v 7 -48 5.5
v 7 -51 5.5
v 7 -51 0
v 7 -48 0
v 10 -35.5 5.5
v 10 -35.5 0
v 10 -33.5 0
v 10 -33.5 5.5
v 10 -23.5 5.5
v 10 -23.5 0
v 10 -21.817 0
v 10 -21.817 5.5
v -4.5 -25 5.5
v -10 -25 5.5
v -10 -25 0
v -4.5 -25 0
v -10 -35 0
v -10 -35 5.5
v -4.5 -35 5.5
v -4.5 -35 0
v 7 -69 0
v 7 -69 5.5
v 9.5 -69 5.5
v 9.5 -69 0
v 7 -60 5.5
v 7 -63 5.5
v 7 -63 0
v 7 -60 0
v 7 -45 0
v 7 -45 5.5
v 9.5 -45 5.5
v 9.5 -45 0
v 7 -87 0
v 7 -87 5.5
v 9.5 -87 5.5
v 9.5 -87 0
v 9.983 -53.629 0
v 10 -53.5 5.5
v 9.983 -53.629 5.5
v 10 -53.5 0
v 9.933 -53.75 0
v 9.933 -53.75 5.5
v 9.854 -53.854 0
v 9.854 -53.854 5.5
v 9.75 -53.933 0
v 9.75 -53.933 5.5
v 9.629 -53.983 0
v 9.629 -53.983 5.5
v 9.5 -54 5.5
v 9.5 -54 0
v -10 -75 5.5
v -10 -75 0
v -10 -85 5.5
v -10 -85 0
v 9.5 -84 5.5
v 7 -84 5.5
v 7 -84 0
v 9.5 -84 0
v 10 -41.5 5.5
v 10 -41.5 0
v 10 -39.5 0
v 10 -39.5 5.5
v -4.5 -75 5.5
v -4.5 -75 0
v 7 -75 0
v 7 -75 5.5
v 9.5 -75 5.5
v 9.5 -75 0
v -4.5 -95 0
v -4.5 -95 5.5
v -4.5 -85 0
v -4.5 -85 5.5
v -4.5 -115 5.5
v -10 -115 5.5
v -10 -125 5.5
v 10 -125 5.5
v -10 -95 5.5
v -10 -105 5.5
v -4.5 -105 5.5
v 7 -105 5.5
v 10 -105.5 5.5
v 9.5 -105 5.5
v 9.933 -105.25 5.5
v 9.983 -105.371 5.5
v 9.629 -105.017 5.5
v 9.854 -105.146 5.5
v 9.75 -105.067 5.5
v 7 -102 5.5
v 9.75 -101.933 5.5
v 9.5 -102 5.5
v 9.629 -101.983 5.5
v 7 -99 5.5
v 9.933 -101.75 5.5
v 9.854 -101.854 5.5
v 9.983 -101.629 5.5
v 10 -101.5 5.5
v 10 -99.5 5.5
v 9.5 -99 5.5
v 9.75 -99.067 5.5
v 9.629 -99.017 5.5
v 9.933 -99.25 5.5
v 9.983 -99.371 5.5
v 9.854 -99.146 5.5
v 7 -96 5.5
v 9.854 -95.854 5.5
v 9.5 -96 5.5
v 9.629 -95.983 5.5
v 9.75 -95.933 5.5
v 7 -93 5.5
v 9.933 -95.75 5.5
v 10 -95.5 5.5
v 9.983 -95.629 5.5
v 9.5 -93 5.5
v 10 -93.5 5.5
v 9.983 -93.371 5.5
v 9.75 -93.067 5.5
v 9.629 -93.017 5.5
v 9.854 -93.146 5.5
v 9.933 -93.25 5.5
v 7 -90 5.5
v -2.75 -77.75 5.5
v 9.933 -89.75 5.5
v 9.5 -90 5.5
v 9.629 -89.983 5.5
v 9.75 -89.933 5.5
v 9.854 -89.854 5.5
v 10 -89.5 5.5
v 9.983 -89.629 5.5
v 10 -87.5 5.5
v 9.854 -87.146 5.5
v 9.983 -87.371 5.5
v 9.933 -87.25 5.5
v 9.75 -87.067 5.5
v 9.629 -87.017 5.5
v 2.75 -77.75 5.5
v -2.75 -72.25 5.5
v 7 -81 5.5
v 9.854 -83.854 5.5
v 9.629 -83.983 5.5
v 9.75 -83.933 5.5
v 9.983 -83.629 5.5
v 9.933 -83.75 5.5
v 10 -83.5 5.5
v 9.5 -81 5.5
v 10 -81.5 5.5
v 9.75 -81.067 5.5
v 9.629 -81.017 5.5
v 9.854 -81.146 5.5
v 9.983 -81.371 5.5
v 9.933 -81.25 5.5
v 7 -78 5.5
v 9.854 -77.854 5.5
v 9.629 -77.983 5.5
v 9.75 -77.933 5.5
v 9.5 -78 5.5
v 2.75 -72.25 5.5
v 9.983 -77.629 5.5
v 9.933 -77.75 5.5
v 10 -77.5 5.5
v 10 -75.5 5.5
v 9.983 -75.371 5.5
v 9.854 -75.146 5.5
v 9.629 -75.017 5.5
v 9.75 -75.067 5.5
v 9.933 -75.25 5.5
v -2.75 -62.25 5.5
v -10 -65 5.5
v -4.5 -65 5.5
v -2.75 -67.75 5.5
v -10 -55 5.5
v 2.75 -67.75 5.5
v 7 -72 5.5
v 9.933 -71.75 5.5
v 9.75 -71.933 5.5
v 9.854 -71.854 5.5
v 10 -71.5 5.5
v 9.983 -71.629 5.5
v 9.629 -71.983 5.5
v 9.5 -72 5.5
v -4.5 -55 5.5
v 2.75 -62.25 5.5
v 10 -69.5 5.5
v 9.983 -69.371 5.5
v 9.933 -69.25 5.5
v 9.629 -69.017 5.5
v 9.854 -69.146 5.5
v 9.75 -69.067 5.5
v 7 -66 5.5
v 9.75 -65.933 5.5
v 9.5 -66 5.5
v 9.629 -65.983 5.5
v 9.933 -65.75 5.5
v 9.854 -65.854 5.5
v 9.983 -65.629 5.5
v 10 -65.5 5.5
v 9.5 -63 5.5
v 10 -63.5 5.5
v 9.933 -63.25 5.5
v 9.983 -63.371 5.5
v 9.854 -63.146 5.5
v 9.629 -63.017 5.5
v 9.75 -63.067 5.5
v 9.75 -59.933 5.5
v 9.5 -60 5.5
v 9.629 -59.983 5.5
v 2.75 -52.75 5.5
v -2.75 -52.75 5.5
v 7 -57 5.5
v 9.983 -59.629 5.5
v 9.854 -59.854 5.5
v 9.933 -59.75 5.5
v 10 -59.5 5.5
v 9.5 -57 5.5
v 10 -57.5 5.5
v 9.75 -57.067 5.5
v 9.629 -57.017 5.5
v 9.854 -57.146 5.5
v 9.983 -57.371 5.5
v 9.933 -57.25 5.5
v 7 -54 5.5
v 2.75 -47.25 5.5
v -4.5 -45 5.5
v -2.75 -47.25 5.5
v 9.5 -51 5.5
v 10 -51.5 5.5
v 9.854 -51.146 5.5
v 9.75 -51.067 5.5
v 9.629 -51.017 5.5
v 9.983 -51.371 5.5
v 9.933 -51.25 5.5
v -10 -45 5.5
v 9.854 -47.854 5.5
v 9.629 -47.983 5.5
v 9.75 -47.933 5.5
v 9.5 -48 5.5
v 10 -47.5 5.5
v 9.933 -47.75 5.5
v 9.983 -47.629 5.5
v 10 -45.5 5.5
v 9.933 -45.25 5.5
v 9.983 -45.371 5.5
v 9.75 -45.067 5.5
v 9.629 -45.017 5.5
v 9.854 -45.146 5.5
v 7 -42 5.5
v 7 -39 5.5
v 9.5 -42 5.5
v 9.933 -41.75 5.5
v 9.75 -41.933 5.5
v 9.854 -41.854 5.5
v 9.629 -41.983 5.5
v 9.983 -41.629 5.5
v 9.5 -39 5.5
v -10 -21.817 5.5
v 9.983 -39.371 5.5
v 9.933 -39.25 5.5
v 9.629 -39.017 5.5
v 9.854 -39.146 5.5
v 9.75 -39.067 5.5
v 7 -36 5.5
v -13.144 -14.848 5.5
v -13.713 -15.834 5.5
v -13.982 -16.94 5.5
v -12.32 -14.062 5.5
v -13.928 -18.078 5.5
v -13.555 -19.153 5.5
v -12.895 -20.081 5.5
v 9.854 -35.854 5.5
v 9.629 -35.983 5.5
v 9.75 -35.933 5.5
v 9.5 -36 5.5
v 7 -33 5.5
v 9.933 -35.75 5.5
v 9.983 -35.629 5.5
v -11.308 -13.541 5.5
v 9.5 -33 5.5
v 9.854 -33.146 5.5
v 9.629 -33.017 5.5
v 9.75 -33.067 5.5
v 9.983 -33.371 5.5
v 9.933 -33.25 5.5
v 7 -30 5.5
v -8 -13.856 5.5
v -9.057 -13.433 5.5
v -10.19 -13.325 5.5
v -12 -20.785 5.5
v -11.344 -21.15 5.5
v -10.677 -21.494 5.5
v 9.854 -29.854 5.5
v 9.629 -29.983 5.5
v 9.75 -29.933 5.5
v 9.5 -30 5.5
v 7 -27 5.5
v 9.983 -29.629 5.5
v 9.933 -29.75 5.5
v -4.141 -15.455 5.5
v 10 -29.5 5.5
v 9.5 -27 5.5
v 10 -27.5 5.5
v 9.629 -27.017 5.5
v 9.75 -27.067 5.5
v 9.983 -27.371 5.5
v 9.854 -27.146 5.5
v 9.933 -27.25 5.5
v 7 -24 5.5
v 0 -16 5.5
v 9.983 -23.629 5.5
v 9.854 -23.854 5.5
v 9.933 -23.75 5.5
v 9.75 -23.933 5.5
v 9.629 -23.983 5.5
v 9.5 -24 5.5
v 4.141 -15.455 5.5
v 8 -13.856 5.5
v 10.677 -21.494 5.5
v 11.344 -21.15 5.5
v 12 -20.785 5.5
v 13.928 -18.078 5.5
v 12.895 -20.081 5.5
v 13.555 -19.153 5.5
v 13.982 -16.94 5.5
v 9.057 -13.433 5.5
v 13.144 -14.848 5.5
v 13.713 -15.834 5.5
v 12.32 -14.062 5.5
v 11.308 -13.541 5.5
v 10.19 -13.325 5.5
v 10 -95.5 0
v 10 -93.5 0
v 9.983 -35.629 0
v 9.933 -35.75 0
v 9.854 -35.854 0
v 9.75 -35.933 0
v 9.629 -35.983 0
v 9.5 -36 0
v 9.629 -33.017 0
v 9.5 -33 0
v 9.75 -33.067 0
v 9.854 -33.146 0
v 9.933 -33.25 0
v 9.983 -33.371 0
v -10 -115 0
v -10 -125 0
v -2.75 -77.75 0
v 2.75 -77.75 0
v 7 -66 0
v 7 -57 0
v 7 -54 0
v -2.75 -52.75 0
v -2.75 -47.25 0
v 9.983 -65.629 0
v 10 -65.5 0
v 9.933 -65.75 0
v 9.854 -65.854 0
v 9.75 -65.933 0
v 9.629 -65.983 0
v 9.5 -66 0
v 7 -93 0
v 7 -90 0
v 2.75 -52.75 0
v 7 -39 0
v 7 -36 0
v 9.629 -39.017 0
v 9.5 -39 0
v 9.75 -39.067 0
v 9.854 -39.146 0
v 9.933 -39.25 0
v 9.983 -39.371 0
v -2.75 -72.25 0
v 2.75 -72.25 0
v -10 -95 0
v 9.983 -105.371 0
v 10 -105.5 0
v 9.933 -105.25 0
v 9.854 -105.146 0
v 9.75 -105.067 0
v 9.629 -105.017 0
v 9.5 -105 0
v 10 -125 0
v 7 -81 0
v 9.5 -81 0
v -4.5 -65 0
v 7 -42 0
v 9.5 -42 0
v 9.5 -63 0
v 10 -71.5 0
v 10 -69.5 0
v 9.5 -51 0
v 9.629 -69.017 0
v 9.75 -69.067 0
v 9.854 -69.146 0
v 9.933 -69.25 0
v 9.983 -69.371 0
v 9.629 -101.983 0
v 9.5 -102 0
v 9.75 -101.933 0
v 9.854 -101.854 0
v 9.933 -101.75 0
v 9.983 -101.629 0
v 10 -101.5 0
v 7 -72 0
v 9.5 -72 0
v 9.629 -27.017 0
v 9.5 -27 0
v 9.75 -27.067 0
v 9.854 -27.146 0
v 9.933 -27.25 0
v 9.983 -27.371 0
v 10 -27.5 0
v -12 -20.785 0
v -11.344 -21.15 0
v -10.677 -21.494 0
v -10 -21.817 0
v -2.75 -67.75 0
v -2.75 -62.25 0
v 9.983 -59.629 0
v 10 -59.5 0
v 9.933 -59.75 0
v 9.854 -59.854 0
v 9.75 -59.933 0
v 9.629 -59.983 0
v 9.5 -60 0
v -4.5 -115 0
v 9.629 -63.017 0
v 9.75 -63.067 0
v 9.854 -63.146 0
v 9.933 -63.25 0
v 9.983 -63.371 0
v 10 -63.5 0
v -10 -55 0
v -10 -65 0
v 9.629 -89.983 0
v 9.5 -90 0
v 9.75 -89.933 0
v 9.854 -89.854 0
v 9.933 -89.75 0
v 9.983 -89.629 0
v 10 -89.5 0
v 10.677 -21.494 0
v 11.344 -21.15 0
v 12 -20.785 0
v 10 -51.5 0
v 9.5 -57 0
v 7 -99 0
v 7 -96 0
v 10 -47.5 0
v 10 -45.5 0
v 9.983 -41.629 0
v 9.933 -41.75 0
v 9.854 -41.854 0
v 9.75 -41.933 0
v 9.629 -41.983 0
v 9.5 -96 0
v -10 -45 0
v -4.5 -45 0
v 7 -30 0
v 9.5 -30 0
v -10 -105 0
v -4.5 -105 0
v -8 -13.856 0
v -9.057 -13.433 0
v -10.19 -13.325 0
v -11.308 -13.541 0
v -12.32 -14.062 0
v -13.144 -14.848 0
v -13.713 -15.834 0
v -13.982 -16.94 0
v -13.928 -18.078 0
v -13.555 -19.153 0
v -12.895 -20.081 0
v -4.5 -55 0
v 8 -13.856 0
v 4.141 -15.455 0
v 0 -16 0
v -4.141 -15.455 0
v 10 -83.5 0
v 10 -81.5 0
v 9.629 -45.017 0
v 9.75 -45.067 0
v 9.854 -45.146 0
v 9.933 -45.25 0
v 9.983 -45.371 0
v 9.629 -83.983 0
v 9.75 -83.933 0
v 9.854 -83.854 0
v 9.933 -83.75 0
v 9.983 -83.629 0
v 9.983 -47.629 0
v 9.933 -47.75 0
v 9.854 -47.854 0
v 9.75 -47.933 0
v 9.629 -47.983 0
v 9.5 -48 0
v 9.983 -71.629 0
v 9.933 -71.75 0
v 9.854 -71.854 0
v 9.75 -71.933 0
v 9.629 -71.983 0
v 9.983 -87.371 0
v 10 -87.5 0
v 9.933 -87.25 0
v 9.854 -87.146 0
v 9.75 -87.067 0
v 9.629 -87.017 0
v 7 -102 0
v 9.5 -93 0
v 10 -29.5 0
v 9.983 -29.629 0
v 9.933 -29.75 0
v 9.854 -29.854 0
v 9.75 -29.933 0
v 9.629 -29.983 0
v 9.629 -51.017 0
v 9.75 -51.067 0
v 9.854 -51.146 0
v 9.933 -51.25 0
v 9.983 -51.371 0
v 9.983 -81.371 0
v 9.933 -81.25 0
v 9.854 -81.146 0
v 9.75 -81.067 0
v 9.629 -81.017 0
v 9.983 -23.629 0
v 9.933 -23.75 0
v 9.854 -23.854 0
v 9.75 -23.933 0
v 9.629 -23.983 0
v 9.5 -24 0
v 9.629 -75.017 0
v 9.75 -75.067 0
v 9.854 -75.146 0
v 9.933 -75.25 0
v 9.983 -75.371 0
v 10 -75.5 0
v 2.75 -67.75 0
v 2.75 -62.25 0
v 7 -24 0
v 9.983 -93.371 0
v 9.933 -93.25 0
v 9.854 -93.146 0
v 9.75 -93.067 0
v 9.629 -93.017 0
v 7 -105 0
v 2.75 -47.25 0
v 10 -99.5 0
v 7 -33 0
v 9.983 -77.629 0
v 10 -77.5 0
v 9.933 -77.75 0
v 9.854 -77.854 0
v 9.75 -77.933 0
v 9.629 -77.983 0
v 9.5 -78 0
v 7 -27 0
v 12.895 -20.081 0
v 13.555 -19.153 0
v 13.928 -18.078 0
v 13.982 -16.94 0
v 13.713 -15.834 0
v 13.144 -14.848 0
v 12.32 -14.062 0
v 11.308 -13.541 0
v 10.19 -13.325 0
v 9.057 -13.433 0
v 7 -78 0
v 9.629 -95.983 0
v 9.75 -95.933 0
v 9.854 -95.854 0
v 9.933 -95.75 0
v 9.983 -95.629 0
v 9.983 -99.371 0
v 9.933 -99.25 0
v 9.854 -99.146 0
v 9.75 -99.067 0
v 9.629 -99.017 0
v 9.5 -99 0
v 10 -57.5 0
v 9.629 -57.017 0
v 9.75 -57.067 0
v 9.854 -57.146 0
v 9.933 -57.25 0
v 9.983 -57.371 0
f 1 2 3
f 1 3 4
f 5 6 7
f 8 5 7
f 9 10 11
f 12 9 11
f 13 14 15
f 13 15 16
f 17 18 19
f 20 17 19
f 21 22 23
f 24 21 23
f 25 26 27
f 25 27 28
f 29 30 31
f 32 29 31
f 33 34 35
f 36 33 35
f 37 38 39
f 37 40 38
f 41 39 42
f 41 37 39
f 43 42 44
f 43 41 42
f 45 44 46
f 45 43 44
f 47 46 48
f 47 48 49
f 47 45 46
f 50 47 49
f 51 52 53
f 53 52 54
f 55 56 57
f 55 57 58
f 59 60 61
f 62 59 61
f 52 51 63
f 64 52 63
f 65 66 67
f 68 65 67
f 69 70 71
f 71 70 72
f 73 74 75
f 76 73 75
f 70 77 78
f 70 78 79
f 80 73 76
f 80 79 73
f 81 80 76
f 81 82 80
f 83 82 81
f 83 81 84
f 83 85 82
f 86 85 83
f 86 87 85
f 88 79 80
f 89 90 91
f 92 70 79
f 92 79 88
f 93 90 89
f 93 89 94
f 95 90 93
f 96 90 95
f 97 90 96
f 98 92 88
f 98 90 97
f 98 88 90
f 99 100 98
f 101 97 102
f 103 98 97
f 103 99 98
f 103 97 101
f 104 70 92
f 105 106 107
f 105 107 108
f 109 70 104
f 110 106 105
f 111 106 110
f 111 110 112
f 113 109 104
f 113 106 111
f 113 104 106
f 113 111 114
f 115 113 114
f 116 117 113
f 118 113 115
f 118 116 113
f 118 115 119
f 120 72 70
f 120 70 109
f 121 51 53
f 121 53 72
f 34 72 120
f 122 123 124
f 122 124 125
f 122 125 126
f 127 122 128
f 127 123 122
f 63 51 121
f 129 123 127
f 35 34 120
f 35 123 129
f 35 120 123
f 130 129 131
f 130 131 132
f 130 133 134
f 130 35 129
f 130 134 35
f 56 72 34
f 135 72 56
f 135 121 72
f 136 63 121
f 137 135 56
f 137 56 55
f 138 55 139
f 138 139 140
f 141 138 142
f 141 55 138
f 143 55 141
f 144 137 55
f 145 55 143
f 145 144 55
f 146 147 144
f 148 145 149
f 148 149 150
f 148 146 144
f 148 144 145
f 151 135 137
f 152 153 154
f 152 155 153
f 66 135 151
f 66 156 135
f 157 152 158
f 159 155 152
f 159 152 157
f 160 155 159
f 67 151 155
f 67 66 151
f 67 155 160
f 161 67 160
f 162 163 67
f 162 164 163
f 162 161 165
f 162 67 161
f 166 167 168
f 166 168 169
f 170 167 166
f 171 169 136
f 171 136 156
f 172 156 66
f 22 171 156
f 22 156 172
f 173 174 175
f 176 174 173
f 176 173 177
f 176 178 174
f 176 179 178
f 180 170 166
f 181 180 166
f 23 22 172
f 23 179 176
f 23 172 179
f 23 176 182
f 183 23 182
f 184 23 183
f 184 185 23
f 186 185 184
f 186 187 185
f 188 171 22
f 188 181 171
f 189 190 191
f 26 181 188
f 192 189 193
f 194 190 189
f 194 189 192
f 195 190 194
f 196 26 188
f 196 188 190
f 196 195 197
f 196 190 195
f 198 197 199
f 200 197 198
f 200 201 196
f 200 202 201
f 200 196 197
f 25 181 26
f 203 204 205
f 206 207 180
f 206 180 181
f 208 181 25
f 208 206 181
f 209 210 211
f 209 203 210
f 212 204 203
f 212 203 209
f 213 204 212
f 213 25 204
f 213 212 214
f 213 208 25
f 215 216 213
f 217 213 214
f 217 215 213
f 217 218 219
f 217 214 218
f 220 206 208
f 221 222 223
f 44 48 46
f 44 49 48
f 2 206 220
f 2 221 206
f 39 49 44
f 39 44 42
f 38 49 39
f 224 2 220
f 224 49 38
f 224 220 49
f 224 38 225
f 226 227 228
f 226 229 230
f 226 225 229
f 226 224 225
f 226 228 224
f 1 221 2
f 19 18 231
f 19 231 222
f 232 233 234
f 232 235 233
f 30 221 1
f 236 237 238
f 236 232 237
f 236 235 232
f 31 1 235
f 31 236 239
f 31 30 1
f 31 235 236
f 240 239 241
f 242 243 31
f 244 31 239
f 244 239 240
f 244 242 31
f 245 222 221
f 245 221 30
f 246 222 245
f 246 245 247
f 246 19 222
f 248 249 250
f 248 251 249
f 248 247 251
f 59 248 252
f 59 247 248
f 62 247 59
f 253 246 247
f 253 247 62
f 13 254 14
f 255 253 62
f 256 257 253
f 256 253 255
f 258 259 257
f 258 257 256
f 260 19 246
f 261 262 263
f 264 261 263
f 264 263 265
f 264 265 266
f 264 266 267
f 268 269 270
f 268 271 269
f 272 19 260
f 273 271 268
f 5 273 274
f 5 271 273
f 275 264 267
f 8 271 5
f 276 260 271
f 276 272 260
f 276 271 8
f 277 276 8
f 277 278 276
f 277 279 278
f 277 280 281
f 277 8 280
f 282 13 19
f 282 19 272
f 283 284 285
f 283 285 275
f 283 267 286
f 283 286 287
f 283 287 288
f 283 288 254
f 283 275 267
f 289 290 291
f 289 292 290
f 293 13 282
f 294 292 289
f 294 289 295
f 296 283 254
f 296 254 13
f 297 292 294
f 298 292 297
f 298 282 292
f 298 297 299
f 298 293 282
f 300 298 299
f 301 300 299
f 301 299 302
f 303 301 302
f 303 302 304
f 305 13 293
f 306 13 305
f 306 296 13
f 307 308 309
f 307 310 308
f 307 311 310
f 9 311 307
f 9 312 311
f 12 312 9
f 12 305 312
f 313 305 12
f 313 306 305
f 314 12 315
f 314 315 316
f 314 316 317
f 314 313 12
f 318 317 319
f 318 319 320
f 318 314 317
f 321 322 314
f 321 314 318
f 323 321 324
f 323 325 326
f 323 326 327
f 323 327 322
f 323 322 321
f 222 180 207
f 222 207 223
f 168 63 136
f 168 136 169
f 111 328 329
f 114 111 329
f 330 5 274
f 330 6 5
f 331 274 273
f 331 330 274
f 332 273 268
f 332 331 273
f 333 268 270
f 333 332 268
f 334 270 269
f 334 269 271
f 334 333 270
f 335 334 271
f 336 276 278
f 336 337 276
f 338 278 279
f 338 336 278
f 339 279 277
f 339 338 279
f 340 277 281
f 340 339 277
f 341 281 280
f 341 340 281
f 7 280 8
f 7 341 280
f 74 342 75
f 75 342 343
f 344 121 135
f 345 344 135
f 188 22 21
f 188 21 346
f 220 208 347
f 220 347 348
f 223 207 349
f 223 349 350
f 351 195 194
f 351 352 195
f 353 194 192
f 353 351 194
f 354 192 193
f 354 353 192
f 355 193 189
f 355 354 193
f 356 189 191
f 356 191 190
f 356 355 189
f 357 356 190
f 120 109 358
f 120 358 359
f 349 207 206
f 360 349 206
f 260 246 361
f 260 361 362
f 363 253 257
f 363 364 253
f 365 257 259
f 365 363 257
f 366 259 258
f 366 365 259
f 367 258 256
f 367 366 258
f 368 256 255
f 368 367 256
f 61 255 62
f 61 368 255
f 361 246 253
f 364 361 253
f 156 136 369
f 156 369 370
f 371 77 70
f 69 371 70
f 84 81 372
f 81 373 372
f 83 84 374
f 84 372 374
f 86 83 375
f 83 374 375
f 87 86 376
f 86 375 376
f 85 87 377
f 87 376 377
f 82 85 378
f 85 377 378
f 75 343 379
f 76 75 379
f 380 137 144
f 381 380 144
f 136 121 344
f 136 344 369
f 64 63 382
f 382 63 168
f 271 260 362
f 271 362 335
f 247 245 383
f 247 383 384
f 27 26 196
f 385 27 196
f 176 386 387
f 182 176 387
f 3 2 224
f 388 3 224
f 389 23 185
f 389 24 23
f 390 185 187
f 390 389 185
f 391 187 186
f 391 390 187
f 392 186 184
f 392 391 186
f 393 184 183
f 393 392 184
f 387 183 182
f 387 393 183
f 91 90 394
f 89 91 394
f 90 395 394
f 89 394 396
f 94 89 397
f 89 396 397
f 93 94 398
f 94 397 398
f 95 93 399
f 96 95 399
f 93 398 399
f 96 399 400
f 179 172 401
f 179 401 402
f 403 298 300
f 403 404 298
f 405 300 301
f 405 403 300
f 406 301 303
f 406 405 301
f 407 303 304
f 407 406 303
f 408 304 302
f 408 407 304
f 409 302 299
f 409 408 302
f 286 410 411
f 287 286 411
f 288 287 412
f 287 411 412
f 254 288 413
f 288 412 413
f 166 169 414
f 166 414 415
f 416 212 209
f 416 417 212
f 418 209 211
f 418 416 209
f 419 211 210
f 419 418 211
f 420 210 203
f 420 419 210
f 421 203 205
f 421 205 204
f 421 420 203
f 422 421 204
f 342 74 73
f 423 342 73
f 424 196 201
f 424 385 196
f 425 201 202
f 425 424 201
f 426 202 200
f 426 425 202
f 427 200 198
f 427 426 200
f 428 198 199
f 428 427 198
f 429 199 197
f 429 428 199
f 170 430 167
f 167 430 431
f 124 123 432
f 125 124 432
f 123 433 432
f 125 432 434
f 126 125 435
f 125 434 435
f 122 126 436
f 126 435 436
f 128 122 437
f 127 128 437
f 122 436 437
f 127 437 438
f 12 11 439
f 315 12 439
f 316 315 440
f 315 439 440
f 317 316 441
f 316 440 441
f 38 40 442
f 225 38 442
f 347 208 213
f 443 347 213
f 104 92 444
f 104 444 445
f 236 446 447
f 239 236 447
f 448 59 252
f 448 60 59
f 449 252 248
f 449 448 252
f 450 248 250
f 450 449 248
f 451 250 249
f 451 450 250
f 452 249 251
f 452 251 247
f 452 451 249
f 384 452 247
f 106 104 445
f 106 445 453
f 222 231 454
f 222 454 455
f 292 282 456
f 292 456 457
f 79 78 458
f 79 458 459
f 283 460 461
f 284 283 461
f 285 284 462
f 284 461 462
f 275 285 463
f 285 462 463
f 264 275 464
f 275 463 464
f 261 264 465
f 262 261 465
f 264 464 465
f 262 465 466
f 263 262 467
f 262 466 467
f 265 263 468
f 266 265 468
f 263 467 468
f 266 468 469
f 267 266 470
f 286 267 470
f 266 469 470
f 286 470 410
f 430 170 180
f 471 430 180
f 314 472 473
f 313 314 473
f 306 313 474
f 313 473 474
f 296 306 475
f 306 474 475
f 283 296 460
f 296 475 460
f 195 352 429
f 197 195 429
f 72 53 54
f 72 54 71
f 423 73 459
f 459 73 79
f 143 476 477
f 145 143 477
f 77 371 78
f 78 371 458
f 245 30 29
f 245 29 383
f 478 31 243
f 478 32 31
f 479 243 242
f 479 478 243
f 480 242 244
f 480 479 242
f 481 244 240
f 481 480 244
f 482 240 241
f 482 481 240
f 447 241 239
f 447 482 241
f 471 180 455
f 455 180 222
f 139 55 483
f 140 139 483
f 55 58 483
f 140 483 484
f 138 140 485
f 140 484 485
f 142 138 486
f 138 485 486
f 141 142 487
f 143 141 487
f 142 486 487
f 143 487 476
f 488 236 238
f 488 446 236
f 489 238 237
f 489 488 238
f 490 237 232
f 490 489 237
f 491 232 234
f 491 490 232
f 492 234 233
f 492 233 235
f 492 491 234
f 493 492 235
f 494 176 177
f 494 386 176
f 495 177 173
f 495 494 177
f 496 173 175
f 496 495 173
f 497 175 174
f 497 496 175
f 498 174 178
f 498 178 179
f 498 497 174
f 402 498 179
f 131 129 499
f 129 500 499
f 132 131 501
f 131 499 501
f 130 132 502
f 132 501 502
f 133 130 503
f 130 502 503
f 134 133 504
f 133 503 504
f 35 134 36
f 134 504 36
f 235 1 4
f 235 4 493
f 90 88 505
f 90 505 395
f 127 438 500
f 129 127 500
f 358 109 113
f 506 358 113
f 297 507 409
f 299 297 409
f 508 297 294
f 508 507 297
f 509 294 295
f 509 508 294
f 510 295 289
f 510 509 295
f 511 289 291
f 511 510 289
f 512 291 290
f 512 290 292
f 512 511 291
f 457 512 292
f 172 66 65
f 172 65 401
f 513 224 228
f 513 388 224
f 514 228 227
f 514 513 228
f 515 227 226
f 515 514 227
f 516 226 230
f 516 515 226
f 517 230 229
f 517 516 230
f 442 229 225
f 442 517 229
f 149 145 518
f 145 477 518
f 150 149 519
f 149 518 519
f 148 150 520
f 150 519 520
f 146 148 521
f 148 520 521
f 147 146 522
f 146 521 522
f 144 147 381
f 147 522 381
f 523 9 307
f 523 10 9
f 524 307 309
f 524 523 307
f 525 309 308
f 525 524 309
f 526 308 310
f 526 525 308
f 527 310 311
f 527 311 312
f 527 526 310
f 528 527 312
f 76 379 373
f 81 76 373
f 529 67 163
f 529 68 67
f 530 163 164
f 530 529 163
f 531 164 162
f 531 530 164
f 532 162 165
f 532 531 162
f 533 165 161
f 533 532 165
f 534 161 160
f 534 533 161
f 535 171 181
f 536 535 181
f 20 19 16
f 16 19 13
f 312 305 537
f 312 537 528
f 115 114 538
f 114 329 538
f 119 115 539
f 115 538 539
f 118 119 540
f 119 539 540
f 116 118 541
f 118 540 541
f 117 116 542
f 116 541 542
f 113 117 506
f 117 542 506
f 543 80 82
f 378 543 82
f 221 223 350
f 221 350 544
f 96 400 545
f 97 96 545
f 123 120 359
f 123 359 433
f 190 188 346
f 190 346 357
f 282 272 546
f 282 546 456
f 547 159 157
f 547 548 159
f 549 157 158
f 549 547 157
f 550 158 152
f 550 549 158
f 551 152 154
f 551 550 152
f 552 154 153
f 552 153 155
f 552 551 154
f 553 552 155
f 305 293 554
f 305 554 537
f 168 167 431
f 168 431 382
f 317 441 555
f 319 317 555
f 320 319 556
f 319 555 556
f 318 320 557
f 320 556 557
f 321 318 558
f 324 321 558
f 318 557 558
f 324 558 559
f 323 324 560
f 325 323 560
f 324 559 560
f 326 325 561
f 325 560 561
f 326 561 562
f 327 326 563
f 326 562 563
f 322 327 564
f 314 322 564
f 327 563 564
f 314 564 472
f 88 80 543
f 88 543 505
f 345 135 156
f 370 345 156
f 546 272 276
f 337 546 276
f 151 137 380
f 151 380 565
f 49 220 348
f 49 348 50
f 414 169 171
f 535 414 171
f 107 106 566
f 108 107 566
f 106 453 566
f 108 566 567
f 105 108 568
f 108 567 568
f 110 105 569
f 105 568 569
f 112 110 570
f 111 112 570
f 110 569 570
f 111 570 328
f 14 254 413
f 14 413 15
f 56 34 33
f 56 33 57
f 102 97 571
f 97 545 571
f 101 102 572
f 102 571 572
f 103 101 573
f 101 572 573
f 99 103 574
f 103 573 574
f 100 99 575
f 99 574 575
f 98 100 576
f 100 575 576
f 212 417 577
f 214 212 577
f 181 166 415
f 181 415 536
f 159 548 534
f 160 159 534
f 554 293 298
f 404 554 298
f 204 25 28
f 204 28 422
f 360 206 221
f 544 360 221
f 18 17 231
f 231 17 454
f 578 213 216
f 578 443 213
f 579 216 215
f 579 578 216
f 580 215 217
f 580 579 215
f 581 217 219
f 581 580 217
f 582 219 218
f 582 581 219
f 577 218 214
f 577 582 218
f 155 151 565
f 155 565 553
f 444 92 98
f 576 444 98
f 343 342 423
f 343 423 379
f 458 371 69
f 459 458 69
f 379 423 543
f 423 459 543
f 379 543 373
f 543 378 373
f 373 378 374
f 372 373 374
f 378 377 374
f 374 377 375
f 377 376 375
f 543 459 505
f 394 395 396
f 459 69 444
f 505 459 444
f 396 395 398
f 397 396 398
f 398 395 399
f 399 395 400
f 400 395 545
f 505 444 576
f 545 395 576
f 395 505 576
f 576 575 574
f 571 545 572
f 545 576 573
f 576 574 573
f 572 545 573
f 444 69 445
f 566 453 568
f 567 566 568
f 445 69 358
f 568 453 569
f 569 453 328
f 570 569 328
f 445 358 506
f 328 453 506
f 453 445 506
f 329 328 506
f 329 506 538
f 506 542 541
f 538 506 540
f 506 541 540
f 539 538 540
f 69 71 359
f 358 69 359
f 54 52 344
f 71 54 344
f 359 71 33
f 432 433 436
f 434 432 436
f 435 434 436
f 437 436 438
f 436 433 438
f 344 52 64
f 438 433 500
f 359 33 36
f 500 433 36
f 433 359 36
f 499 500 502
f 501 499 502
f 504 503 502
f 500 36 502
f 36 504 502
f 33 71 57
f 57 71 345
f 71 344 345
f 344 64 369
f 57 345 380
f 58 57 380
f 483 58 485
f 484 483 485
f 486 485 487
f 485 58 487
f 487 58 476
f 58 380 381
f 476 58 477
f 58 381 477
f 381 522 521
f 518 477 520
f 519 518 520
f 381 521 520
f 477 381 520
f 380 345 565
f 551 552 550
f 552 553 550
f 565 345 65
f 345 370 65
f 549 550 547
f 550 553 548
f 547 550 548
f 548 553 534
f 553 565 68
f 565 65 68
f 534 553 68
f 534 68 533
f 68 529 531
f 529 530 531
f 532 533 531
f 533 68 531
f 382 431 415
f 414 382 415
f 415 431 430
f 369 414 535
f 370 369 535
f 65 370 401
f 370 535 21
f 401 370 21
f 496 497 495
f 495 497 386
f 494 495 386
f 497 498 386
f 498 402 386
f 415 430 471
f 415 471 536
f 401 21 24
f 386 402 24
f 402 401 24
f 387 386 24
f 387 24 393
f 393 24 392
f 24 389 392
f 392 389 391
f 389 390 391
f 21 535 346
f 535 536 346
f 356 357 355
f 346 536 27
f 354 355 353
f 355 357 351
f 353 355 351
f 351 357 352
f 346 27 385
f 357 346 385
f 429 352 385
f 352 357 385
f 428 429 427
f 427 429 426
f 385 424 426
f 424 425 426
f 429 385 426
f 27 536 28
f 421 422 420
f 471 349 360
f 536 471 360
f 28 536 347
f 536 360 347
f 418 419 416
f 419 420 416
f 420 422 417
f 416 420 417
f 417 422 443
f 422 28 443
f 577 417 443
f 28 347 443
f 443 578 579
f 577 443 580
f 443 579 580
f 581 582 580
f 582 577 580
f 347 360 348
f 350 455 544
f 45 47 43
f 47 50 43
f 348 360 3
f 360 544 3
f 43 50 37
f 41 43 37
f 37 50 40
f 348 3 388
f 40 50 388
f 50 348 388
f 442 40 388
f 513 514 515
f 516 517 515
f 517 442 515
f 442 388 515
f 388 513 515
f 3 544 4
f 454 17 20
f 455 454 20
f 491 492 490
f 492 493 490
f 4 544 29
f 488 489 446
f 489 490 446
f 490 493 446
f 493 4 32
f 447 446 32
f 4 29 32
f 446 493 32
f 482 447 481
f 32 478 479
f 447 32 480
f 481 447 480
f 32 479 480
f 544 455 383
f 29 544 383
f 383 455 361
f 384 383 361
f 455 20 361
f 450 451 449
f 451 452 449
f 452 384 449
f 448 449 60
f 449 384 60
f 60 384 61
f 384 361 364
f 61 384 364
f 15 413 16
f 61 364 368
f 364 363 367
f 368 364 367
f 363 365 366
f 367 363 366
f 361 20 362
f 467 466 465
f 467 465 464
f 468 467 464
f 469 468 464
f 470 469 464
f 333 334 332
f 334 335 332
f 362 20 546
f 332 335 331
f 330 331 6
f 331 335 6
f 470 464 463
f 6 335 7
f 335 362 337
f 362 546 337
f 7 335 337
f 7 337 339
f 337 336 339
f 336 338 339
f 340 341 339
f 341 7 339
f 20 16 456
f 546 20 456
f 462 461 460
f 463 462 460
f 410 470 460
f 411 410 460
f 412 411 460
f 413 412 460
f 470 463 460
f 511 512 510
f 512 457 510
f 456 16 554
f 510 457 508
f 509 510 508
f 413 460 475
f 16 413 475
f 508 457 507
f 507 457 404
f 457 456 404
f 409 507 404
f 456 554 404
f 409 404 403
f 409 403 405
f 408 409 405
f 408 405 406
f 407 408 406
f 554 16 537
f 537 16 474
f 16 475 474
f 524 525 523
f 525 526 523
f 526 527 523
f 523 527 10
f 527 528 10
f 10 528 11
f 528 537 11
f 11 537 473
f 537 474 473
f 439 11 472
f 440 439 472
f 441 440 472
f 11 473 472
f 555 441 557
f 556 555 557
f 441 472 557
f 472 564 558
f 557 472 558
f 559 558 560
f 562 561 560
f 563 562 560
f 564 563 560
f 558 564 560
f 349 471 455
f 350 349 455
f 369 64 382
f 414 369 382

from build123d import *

# Parameters (mm, degrees)
EXTRUDE_1_DEPTH     = 5.5
SKETCH_2_W          = 5.5
SKETCH_2_H          = 10
SKETCH_2_W_2        = 3
SKETCH_2_H_2        = 3
CUT_EXTRUDE_1_DEPTH = 126.901747406
SKETCH_5_W          = 5.5
SKETCH_5_H          = 5.5
CUT_EXTRUDE_2_DEPTH = 126.901747406
FILLET_1_R          = 0.5


with BuildPart() as part:
    # ｽｹｯﾁ1 → ﾎﾞｽ - 押し出し1 (new body)
    with BuildSketch(Plane.XY):
        with BuildLine():
            Line((-10, -21.817424229), (-10, -125))
            Line((-10, -125), (10, -125))
            Line((10, -125), (10, -21.817424229))
            ThreePointArc((10, -21.817424229), (11.012114986, -21.324477099), (12, -20.784609691))
            ThreePointArc((12, -20.784609691), (13.464101615, -15.320508076), (8, -13.856406461))
            ThreePointArc((8, -13.856406461), (0, -16), (-8, -13.856406461))
            ThreePointArc((-8, -13.856406461), (-13.464101615, -15.320508076), (-12, -20.784609691))
            ThreePointArc((-12, -20.784609691), (-11.012114986, -21.324477099), (-10, -21.817424229))
        make_face()
    extrude(amount=EXTRUDE_1_DEPTH)

    # ｽｹｯﾁ2 → ｶｯﾄ - 押し出し1 (cut, through all)
    with BuildSketch(Plane.XY.offset(5.5)):
        with Locations((-7.25, -90)):
            Rectangle(SKETCH_2_W, SKETCH_2_H)
        with Locations((-7.25, -110)):
            Rectangle(SKETCH_2_W, SKETCH_2_H)
        with Locations((-7.25, -70)):
            Rectangle(SKETCH_2_W, SKETCH_2_H)
        with Locations((-7.25, -50)):
            Rectangle(SKETCH_2_W, SKETCH_2_H)
        with Locations((-7.25, -30)):
            Rectangle(SKETCH_2_W, SKETCH_2_H)
        with Locations((8.5, -103.5)):
            Rectangle(SKETCH_2_W_2, SKETCH_2_H_2)
        with Locations((8.5, -97.5)):
            Rectangle(SKETCH_2_W_2, SKETCH_2_H_2)
        with Locations((8.5, -91.5)):
            Rectangle(SKETCH_2_W_2, SKETCH_2_H_2)
        with Locations((8.5, -85.5)):
            Rectangle(SKETCH_2_W_2, SKETCH_2_H_2)
        with Locations((8.5, -79.5)):
            Rectangle(SKETCH_2_W_2, SKETCH_2_H_2)
        with Locations((8.5, -73.5)):
            Rectangle(SKETCH_2_W_2, SKETCH_2_H_2)
        with Locations((8.5, -67.5)):
            Rectangle(SKETCH_2_W_2, SKETCH_2_H_2)
        with Locations((8.5, -61.5)):
            Rectangle(SKETCH_2_W_2, SKETCH_2_H_2)
        with Locations((8.5, -55.5)):
            Rectangle(SKETCH_2_W_2, SKETCH_2_H_2)
        with Locations((8.5, -49.5)):
            Rectangle(SKETCH_2_W_2, SKETCH_2_H_2)
        with Locations((8.5, -43.5)):
            Rectangle(SKETCH_2_W_2, SKETCH_2_H_2)
        with Locations((8.5, -37.5)):
            Rectangle(SKETCH_2_W_2, SKETCH_2_H_2)
        with Locations((8.5, -31.5)):
            Rectangle(SKETCH_2_W_2, SKETCH_2_H_2)
        with Locations((8.5, -25.5)):
            Rectangle(SKETCH_2_W_2, SKETCH_2_H_2)
    extrude(amount=-CUT_EXTRUDE_1_DEPTH, mode=Mode.SUBTRACT)

    # ｽｹｯﾁ5 → ｶｯﾄ - 押し出し2 (cut, through all)
    with BuildSketch(Plane.XY.offset(5.5)):
        with Locations((0, -65)):
            Rectangle(SKETCH_5_W, SKETCH_5_H)
        with Locations((0, -50)):
            Rectangle(SKETCH_5_W, SKETCH_5_H)
        with Locations((0, -75)):
            Rectangle(SKETCH_5_W, SKETCH_5_H)
    extrude(amount=-CUT_EXTRUDE_2_DEPTH, mode=Mode.SUBTRACT)

    # ﾌｨﾚｯﾄ1
    fillet_1_edges = [part.edges().sort_by_distance(p)[0] for p in [
        (10, -39, 2.75),
        (10, -36, 2.75),
        (10, -45, 2.75),
        (10, -42, 2.75),
        (10, -51, 2.75),
        (10, -48, 2.75),
        (10, -57, 2.75),
        (10, -54, 2.75),
        (10, -63, 2.75),
        (10, -60, 2.75),
        (10, -69, 2.75),
        (10, -66, 2.75),
        (10, -75, 2.75),
        (10, -72, 2.75),
        (10, -81, 2.75),
        (10, -78, 2.75),
        (10, -87, 2.75),
        (10, -84, 2.75),
        (10, -93, 2.75),
        (10, -90, 2.75),
        (10, -99, 2.75),
        (10, -96, 2.75),
        (10, -102, 2.75),
        (10, -105, 2.75),
        (10, -33, 2.75),
        (10, -30, 2.75),
        (10, -27, 2.75),
        (10, -24, 2.75),
    ]]
    fillet(fillet_1_edges, radius=FILLET_1_R)


solid = part.part
